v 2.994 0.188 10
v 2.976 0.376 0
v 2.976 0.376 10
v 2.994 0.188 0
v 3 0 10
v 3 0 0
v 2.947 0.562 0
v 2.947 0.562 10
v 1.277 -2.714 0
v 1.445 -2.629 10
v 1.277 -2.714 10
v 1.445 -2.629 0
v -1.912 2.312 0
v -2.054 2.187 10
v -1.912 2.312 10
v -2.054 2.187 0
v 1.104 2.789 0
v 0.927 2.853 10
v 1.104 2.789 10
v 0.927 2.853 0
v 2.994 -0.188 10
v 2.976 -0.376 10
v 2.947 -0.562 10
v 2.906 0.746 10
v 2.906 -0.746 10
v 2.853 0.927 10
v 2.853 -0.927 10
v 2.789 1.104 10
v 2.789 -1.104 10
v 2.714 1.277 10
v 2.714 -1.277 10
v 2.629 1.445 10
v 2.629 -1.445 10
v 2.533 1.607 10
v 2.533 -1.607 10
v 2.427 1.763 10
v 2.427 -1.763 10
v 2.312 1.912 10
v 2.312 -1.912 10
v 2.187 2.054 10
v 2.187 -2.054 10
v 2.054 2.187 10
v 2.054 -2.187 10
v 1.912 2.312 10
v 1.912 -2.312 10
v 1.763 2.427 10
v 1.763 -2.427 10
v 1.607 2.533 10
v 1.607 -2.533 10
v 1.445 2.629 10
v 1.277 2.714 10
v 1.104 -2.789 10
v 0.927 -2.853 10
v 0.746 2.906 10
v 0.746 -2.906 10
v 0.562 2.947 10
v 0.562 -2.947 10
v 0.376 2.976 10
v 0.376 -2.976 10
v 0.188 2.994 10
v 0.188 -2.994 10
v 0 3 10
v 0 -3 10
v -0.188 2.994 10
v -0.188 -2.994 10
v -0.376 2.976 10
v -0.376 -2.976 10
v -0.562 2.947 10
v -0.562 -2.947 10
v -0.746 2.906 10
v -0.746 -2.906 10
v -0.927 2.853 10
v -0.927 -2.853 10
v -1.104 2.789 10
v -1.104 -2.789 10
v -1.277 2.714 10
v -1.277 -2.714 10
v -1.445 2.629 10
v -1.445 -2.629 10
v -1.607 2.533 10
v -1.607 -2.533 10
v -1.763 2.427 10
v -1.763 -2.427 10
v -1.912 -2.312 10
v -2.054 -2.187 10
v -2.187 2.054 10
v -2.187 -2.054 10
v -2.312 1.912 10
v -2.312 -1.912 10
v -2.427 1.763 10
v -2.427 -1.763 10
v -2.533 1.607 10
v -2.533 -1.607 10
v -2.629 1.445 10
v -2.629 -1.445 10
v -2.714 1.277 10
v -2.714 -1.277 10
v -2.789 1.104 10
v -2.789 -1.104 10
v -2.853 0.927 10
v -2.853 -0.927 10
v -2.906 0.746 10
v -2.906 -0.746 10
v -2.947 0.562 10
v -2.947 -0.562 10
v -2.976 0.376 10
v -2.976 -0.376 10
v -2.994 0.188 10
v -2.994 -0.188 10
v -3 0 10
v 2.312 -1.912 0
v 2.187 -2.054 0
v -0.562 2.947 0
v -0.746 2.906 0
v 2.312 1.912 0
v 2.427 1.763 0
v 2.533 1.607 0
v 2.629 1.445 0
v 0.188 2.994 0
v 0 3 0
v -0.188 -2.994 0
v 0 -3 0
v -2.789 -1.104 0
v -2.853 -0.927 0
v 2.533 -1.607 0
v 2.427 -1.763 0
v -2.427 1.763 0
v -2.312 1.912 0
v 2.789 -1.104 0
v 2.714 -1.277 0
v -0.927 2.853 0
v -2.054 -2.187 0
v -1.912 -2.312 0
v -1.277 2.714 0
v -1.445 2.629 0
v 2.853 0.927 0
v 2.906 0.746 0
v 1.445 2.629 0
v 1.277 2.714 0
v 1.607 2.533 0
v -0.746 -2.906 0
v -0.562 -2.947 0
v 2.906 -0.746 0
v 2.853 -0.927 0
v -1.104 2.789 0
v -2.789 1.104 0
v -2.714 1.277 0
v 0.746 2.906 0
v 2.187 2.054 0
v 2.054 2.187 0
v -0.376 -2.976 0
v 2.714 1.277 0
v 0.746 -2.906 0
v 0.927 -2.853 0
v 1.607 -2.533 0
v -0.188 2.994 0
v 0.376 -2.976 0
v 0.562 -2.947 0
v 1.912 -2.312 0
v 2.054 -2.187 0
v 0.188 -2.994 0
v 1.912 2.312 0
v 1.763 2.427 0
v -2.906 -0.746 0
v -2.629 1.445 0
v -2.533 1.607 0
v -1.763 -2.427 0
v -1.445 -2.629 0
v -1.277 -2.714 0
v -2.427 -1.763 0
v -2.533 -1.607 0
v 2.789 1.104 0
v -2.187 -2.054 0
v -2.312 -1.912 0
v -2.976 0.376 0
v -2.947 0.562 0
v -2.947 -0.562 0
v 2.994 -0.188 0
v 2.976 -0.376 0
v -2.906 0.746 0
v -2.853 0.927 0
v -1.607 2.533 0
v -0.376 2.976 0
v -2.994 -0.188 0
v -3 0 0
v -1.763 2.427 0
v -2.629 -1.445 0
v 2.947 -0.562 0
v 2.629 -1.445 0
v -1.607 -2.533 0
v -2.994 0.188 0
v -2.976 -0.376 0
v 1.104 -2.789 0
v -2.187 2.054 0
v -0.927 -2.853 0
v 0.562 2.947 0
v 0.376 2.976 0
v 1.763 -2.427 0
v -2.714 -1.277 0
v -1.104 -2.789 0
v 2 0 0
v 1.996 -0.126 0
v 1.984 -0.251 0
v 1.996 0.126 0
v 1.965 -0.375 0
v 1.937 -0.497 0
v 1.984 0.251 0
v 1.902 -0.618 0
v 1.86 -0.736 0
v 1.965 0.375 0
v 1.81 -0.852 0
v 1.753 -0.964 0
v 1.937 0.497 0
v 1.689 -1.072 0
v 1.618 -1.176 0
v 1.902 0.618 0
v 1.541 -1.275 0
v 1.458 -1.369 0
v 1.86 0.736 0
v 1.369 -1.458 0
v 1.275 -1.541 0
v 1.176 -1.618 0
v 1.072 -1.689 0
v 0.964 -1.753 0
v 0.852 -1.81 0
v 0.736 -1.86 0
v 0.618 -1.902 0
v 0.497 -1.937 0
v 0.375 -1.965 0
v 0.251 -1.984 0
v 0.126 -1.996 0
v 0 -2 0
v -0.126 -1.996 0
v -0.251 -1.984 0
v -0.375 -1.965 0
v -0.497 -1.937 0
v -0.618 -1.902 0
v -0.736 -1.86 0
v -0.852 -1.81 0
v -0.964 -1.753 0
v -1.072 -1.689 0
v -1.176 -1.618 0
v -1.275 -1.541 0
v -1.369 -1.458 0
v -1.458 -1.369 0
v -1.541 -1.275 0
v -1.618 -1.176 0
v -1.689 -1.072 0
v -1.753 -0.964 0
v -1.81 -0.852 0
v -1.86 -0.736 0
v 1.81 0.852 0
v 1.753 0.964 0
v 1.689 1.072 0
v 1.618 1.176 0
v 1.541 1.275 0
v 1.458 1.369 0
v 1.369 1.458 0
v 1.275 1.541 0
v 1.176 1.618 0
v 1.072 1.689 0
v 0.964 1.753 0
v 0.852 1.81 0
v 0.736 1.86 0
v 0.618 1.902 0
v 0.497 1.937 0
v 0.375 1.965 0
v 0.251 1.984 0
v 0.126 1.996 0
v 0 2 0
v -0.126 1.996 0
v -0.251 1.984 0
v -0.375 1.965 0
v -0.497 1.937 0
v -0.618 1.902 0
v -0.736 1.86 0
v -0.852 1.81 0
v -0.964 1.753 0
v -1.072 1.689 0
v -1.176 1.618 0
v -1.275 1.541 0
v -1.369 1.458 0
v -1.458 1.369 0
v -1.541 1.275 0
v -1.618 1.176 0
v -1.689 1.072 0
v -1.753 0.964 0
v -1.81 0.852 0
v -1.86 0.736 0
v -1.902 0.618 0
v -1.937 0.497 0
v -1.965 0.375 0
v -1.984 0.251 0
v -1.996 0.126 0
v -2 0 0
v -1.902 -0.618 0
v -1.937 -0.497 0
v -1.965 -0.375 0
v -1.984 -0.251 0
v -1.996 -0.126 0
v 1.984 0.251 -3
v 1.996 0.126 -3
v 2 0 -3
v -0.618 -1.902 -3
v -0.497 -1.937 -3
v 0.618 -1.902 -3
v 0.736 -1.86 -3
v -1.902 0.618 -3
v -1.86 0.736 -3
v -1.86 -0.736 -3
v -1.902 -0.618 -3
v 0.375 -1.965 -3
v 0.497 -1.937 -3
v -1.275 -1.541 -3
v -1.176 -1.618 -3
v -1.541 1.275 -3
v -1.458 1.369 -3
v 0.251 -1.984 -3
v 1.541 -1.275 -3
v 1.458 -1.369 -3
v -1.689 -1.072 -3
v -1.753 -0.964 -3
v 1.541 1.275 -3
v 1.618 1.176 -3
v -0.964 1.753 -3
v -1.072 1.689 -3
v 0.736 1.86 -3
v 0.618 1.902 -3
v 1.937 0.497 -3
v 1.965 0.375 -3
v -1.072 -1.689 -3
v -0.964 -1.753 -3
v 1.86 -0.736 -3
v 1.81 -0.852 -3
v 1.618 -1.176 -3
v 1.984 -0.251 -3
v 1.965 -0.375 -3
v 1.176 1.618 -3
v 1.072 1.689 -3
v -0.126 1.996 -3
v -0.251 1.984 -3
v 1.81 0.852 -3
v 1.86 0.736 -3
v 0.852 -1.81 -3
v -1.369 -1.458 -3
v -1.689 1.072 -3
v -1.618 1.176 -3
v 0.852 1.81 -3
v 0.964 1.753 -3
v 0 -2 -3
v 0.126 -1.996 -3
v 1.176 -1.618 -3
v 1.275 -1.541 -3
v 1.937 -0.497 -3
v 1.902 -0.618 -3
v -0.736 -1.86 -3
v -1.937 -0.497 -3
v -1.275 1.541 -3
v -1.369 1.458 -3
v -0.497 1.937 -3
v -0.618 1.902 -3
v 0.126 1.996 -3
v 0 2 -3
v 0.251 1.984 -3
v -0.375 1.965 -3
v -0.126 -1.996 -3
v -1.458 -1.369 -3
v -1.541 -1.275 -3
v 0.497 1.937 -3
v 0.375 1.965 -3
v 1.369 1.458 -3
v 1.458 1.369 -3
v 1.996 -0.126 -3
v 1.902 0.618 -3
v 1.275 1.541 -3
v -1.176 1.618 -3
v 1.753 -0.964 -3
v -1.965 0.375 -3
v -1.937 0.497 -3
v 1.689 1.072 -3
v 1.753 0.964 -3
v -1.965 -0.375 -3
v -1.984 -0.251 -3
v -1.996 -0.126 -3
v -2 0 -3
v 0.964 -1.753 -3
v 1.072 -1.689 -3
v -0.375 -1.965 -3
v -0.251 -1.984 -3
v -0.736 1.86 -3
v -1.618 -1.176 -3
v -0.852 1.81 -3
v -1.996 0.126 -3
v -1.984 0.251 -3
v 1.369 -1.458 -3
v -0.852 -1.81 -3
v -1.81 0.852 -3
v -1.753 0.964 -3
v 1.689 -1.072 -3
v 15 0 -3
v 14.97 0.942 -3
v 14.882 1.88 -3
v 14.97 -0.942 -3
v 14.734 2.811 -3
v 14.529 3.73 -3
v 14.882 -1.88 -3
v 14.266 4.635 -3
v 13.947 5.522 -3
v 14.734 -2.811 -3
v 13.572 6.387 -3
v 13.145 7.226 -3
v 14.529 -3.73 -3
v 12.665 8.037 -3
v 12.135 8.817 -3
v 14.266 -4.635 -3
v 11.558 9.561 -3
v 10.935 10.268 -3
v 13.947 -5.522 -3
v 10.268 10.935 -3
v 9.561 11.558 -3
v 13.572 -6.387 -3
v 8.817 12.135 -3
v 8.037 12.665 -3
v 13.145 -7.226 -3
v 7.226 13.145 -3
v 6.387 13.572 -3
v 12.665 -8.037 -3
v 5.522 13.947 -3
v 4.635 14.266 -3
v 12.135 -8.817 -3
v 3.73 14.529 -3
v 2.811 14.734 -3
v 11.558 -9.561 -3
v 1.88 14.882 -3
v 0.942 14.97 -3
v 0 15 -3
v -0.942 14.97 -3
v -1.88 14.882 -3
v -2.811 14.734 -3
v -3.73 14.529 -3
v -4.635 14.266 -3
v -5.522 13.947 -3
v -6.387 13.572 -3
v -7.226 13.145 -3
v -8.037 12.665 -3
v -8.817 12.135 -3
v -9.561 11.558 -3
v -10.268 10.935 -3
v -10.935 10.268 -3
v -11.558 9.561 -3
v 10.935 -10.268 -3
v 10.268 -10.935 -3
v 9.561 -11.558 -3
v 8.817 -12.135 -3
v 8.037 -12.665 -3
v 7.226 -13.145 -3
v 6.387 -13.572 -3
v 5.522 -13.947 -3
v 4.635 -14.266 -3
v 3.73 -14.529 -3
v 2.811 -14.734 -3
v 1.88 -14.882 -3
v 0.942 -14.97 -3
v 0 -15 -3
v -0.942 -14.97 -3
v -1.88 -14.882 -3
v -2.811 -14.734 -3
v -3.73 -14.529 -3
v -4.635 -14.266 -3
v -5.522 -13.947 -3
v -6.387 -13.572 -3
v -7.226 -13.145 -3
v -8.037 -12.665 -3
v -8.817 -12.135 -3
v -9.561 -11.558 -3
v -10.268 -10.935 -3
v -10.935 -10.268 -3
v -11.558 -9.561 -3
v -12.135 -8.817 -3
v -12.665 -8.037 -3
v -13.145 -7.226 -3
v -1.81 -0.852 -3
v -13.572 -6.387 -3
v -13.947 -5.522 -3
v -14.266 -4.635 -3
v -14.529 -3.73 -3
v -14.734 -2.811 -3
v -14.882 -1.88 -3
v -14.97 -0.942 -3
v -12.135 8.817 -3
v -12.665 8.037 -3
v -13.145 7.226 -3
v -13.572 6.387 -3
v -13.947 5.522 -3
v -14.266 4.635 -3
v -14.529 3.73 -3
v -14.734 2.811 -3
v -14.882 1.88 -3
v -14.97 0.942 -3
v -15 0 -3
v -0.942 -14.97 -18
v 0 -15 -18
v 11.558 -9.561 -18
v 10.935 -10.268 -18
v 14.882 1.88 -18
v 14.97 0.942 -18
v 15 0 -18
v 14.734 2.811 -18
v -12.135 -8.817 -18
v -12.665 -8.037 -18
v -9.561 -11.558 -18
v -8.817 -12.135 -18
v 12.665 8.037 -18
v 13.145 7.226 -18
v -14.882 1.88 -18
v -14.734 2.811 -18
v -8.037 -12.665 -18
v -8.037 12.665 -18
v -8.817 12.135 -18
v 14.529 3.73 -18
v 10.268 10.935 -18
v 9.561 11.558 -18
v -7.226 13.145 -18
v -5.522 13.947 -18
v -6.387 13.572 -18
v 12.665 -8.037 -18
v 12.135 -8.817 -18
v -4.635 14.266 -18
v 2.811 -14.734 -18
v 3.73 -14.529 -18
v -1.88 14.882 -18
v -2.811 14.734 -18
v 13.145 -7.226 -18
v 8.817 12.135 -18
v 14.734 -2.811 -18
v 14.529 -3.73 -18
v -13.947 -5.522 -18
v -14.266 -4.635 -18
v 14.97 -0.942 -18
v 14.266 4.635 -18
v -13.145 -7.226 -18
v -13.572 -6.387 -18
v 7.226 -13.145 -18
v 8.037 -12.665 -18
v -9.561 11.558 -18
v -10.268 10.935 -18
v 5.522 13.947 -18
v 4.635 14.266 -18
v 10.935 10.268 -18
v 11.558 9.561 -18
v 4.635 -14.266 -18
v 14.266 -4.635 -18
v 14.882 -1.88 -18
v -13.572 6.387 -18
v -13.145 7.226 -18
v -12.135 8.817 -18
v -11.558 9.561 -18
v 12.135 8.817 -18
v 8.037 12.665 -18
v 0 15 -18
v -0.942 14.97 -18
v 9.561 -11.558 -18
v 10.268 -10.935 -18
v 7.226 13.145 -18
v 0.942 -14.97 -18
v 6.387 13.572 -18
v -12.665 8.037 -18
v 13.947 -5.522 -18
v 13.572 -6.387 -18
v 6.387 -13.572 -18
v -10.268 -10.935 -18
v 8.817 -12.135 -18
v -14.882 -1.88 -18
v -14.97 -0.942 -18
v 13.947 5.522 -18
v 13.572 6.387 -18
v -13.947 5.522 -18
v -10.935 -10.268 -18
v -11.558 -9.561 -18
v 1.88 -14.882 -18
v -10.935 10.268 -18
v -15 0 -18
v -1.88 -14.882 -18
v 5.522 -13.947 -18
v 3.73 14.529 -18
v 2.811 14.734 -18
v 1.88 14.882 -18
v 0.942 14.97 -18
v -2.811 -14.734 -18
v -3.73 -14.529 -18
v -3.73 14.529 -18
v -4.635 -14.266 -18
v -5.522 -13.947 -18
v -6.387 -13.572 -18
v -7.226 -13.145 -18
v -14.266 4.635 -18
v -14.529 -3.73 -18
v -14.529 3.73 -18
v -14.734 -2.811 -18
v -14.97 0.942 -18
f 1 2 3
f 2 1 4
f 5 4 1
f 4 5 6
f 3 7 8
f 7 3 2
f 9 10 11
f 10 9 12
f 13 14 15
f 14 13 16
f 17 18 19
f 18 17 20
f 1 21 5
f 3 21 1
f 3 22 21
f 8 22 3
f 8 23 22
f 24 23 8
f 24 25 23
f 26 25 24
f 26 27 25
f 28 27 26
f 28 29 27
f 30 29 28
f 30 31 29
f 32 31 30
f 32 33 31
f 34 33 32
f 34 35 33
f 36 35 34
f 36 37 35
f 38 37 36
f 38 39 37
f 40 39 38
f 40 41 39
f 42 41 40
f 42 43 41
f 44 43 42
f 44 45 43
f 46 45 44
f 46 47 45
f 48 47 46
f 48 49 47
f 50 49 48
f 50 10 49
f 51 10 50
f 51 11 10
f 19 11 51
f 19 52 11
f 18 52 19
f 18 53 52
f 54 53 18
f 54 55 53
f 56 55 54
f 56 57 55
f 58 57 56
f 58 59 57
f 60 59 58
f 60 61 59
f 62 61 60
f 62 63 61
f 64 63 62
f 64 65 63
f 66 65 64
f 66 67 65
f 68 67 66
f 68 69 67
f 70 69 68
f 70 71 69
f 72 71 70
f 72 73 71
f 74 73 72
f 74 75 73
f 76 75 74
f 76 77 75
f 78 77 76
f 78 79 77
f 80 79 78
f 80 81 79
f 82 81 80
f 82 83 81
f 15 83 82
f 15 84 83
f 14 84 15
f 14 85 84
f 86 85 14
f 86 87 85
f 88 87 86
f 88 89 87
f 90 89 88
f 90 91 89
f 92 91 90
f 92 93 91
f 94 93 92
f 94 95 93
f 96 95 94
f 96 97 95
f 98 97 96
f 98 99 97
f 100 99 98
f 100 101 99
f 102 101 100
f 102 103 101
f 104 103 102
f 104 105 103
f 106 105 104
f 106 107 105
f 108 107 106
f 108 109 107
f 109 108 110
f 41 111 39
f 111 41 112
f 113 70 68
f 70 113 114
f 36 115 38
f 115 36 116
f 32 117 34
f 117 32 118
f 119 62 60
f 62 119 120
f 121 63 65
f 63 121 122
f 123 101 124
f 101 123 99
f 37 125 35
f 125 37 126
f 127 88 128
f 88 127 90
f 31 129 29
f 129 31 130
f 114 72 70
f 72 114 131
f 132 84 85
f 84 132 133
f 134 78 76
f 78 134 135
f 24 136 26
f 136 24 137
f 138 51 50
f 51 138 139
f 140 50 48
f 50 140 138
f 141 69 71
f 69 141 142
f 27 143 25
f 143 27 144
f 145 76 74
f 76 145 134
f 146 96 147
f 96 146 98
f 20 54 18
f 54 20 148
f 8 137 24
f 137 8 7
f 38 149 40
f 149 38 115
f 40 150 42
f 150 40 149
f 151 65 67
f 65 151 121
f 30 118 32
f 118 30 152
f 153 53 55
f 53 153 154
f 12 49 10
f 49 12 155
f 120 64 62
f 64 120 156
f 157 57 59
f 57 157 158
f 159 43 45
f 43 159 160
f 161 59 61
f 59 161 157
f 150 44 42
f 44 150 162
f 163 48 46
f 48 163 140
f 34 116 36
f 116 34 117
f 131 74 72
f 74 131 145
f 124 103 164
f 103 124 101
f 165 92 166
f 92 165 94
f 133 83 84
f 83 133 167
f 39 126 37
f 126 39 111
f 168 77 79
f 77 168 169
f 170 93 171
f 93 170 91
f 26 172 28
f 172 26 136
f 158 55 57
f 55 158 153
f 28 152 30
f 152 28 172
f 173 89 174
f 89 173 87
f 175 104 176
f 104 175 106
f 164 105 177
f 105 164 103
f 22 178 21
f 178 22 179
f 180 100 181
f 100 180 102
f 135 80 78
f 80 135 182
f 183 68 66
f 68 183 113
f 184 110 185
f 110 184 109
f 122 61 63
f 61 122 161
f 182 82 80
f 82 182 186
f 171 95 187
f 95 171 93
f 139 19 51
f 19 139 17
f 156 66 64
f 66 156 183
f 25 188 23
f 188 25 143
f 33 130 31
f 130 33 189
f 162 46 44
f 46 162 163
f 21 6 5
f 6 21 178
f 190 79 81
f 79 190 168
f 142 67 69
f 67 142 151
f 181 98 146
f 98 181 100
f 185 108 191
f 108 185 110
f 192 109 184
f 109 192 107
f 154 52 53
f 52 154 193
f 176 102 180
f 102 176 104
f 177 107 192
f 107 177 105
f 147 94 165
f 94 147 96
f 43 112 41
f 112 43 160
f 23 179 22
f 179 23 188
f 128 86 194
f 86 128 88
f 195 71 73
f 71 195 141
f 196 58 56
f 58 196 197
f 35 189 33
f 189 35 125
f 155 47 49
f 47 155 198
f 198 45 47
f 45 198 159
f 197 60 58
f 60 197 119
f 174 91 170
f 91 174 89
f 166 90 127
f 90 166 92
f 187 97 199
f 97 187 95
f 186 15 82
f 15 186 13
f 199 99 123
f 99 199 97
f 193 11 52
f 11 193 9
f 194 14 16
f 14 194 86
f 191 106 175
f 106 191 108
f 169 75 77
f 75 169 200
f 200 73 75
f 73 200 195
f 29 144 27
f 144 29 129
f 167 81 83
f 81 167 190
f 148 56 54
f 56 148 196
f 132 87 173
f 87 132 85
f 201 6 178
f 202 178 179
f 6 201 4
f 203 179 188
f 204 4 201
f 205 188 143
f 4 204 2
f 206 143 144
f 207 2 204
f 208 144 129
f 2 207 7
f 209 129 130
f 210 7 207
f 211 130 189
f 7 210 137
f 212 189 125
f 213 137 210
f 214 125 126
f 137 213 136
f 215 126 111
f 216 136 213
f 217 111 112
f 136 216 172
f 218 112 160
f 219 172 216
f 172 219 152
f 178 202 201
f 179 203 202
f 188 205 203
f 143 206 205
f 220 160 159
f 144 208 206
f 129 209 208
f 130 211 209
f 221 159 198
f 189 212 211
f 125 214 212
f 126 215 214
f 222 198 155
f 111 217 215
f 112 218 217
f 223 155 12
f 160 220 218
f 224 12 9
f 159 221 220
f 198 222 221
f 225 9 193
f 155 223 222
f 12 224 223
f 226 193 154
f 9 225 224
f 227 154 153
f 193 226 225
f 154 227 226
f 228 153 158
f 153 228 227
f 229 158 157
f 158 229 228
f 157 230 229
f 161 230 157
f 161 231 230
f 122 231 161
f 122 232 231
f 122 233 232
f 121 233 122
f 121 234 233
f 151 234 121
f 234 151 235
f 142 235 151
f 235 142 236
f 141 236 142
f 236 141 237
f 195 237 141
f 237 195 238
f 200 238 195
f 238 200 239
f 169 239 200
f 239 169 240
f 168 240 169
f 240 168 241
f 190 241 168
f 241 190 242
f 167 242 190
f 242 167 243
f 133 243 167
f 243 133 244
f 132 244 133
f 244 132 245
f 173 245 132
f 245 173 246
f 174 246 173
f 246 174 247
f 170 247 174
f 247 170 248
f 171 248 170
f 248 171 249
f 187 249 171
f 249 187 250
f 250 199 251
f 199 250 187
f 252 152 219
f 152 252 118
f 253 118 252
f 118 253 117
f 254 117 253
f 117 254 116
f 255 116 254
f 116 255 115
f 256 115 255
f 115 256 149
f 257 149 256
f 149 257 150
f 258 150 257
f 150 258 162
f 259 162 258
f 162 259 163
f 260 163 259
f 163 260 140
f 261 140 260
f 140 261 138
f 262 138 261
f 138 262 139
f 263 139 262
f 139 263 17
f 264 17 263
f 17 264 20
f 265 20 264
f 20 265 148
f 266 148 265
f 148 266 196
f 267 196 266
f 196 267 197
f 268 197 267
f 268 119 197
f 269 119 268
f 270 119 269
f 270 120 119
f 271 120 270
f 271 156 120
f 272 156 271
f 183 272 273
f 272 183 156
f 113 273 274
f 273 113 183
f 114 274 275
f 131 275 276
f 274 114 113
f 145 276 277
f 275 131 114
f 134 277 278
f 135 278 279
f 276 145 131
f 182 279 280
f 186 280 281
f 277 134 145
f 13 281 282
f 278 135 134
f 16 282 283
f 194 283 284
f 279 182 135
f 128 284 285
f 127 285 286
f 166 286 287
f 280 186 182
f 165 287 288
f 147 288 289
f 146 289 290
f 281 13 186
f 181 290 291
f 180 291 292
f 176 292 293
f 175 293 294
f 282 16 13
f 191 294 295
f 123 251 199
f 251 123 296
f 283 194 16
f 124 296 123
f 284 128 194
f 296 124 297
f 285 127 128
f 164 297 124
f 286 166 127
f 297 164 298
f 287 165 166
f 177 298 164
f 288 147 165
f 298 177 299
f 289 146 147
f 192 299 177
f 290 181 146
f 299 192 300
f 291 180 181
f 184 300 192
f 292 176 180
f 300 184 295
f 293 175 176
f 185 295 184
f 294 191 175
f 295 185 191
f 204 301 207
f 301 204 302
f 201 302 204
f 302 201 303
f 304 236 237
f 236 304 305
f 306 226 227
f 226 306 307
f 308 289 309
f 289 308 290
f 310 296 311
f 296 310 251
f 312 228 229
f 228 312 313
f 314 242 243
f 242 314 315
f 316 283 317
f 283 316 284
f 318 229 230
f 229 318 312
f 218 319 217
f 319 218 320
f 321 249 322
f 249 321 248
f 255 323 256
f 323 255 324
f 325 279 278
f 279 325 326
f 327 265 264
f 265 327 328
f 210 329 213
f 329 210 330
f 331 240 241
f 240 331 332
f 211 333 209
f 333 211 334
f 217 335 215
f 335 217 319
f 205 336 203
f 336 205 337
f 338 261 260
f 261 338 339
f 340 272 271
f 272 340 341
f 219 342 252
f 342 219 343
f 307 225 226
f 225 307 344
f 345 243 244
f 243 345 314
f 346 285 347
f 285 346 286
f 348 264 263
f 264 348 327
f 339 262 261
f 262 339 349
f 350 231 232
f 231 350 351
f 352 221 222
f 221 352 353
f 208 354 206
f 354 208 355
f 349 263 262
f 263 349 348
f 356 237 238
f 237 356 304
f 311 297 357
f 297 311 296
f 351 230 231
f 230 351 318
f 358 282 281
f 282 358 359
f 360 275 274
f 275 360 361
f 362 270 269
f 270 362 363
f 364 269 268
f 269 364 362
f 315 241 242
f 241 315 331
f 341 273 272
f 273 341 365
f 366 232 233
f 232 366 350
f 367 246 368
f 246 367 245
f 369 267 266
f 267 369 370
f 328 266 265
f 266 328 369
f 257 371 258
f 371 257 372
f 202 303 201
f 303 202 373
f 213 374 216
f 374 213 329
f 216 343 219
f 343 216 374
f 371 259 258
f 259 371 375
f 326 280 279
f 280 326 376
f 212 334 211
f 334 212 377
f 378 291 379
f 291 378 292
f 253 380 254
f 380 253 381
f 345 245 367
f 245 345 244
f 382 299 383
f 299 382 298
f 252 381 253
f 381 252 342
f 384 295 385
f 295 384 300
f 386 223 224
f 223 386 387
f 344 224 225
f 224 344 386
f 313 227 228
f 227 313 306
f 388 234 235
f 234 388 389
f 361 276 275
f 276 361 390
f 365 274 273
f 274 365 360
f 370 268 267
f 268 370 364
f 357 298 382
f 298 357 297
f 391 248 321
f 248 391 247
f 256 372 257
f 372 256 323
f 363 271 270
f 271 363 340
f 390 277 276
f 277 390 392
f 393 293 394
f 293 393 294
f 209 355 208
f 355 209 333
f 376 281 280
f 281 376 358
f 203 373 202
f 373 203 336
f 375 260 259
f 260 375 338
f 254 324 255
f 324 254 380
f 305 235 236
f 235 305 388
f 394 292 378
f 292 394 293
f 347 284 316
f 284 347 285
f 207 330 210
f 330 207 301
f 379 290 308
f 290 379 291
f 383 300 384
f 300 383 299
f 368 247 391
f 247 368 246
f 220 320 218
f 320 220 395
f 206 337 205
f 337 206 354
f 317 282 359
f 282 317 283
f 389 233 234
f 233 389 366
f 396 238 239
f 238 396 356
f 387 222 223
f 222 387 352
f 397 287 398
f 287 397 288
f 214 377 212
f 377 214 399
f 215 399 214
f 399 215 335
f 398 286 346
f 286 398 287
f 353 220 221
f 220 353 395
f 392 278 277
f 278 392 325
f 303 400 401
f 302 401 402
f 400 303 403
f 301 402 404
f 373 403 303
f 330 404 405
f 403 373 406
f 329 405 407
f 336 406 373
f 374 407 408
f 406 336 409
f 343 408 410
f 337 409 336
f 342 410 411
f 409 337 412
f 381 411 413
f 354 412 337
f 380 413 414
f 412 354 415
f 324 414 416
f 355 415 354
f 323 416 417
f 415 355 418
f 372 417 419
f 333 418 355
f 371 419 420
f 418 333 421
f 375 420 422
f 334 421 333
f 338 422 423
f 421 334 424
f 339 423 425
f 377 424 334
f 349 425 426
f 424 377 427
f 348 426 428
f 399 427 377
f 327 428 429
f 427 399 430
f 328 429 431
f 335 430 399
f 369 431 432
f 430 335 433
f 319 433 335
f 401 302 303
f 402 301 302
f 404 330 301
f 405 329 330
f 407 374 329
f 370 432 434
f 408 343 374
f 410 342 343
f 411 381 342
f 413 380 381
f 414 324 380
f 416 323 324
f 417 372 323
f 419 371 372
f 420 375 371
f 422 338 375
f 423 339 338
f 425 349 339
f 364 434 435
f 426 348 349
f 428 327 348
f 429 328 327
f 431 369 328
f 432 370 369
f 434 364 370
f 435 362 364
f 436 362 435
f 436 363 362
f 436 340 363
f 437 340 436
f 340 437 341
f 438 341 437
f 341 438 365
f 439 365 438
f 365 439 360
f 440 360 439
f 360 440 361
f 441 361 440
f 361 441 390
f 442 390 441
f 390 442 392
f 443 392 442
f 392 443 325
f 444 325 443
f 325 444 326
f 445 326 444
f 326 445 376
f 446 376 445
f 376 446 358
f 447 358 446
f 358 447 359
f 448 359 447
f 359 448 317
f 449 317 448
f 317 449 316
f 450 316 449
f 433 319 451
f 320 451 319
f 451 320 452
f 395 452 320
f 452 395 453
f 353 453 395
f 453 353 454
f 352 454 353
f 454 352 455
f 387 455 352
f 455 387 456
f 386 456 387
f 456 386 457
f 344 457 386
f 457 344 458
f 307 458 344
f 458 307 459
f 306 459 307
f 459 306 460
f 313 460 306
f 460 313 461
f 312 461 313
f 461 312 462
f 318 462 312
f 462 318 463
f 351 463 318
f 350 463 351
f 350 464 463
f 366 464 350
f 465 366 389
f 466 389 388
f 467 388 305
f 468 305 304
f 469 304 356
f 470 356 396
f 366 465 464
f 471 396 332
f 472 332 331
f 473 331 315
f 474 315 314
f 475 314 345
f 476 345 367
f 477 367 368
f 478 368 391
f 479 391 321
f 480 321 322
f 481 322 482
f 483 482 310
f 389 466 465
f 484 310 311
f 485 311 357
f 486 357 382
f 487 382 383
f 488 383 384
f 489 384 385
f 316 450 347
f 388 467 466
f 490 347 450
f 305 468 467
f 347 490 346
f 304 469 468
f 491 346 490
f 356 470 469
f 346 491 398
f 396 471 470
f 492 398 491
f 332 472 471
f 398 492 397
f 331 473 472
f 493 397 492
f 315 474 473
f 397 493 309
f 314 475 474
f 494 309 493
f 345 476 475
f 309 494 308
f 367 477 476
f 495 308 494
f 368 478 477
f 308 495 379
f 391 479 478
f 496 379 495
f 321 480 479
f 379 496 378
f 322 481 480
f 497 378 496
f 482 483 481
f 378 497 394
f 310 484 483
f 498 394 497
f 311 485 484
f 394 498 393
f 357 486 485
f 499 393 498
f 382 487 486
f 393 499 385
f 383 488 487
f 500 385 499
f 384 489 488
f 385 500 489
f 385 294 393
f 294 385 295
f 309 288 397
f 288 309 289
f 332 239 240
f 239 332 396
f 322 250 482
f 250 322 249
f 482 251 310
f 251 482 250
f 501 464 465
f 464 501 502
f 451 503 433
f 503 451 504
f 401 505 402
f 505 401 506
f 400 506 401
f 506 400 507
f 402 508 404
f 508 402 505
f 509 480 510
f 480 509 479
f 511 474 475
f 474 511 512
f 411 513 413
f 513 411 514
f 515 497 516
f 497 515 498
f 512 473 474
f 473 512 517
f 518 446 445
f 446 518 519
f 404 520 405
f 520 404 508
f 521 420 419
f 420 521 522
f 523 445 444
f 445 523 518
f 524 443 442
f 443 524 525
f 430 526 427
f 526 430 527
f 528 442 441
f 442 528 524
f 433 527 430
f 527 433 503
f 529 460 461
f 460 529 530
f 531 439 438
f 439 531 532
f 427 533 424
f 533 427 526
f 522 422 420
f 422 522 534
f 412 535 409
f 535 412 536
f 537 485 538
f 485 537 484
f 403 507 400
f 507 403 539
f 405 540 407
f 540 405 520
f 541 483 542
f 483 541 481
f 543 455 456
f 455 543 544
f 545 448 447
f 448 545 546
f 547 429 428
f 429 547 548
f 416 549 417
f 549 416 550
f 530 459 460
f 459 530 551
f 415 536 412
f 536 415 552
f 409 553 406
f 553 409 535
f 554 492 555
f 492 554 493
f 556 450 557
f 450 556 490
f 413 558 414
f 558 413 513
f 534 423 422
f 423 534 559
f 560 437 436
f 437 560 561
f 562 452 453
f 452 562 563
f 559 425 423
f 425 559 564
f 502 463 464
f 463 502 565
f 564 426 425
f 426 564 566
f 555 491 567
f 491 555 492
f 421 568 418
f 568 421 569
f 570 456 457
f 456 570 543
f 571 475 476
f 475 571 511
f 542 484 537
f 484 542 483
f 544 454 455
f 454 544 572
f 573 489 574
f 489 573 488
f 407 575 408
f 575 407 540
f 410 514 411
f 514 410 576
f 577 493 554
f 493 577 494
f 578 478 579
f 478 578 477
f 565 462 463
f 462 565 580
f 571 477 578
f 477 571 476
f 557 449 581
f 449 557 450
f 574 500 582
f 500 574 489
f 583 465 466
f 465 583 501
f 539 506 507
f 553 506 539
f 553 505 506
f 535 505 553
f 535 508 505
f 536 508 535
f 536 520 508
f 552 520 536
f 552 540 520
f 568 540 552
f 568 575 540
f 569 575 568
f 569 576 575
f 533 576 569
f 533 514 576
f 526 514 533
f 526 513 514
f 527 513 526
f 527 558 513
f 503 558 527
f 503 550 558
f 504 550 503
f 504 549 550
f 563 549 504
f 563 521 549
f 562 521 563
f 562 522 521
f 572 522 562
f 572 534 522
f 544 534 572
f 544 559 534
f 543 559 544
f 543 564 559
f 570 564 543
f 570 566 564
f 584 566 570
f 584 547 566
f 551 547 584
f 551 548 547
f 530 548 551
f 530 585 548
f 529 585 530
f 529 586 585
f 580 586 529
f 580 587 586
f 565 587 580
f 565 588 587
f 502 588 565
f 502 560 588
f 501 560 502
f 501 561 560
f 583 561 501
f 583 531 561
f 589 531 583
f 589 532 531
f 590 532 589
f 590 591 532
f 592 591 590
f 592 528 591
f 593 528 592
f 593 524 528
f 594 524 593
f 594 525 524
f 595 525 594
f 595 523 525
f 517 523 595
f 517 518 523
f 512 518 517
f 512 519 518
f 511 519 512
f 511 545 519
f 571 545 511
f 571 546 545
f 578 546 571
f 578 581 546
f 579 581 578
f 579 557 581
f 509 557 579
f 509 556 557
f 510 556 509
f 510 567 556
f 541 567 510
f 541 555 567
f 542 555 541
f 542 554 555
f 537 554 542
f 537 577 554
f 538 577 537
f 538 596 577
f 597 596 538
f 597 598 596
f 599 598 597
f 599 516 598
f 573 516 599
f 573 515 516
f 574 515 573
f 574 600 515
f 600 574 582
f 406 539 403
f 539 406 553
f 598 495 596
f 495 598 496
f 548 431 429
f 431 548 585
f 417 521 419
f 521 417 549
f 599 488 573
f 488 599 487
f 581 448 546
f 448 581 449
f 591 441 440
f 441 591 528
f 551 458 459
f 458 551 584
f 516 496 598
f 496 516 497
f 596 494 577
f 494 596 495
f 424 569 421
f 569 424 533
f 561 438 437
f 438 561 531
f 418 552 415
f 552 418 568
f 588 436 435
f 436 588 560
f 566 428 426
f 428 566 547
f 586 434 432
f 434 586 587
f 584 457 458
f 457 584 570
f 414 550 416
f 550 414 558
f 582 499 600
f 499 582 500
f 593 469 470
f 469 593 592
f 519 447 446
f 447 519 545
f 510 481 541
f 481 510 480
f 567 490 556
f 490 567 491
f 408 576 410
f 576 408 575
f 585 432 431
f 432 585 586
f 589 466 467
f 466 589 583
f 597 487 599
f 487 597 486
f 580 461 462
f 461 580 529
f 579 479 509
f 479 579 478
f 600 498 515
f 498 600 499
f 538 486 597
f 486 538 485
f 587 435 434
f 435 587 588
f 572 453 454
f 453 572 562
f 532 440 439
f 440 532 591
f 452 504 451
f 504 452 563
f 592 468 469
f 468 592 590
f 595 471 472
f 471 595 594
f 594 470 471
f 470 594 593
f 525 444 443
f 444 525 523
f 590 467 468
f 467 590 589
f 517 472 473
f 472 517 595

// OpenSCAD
$fn=100;
module motor(){
    motor_height=15;
    cylinder(r=6/2,h=10);
    translate([0,0,-3])
    cylinder(r=4/2,h=3);
    translate([0,0,-3-motor_height])
    cylinder(r=30/2,h=motor_height);
}

motor();
